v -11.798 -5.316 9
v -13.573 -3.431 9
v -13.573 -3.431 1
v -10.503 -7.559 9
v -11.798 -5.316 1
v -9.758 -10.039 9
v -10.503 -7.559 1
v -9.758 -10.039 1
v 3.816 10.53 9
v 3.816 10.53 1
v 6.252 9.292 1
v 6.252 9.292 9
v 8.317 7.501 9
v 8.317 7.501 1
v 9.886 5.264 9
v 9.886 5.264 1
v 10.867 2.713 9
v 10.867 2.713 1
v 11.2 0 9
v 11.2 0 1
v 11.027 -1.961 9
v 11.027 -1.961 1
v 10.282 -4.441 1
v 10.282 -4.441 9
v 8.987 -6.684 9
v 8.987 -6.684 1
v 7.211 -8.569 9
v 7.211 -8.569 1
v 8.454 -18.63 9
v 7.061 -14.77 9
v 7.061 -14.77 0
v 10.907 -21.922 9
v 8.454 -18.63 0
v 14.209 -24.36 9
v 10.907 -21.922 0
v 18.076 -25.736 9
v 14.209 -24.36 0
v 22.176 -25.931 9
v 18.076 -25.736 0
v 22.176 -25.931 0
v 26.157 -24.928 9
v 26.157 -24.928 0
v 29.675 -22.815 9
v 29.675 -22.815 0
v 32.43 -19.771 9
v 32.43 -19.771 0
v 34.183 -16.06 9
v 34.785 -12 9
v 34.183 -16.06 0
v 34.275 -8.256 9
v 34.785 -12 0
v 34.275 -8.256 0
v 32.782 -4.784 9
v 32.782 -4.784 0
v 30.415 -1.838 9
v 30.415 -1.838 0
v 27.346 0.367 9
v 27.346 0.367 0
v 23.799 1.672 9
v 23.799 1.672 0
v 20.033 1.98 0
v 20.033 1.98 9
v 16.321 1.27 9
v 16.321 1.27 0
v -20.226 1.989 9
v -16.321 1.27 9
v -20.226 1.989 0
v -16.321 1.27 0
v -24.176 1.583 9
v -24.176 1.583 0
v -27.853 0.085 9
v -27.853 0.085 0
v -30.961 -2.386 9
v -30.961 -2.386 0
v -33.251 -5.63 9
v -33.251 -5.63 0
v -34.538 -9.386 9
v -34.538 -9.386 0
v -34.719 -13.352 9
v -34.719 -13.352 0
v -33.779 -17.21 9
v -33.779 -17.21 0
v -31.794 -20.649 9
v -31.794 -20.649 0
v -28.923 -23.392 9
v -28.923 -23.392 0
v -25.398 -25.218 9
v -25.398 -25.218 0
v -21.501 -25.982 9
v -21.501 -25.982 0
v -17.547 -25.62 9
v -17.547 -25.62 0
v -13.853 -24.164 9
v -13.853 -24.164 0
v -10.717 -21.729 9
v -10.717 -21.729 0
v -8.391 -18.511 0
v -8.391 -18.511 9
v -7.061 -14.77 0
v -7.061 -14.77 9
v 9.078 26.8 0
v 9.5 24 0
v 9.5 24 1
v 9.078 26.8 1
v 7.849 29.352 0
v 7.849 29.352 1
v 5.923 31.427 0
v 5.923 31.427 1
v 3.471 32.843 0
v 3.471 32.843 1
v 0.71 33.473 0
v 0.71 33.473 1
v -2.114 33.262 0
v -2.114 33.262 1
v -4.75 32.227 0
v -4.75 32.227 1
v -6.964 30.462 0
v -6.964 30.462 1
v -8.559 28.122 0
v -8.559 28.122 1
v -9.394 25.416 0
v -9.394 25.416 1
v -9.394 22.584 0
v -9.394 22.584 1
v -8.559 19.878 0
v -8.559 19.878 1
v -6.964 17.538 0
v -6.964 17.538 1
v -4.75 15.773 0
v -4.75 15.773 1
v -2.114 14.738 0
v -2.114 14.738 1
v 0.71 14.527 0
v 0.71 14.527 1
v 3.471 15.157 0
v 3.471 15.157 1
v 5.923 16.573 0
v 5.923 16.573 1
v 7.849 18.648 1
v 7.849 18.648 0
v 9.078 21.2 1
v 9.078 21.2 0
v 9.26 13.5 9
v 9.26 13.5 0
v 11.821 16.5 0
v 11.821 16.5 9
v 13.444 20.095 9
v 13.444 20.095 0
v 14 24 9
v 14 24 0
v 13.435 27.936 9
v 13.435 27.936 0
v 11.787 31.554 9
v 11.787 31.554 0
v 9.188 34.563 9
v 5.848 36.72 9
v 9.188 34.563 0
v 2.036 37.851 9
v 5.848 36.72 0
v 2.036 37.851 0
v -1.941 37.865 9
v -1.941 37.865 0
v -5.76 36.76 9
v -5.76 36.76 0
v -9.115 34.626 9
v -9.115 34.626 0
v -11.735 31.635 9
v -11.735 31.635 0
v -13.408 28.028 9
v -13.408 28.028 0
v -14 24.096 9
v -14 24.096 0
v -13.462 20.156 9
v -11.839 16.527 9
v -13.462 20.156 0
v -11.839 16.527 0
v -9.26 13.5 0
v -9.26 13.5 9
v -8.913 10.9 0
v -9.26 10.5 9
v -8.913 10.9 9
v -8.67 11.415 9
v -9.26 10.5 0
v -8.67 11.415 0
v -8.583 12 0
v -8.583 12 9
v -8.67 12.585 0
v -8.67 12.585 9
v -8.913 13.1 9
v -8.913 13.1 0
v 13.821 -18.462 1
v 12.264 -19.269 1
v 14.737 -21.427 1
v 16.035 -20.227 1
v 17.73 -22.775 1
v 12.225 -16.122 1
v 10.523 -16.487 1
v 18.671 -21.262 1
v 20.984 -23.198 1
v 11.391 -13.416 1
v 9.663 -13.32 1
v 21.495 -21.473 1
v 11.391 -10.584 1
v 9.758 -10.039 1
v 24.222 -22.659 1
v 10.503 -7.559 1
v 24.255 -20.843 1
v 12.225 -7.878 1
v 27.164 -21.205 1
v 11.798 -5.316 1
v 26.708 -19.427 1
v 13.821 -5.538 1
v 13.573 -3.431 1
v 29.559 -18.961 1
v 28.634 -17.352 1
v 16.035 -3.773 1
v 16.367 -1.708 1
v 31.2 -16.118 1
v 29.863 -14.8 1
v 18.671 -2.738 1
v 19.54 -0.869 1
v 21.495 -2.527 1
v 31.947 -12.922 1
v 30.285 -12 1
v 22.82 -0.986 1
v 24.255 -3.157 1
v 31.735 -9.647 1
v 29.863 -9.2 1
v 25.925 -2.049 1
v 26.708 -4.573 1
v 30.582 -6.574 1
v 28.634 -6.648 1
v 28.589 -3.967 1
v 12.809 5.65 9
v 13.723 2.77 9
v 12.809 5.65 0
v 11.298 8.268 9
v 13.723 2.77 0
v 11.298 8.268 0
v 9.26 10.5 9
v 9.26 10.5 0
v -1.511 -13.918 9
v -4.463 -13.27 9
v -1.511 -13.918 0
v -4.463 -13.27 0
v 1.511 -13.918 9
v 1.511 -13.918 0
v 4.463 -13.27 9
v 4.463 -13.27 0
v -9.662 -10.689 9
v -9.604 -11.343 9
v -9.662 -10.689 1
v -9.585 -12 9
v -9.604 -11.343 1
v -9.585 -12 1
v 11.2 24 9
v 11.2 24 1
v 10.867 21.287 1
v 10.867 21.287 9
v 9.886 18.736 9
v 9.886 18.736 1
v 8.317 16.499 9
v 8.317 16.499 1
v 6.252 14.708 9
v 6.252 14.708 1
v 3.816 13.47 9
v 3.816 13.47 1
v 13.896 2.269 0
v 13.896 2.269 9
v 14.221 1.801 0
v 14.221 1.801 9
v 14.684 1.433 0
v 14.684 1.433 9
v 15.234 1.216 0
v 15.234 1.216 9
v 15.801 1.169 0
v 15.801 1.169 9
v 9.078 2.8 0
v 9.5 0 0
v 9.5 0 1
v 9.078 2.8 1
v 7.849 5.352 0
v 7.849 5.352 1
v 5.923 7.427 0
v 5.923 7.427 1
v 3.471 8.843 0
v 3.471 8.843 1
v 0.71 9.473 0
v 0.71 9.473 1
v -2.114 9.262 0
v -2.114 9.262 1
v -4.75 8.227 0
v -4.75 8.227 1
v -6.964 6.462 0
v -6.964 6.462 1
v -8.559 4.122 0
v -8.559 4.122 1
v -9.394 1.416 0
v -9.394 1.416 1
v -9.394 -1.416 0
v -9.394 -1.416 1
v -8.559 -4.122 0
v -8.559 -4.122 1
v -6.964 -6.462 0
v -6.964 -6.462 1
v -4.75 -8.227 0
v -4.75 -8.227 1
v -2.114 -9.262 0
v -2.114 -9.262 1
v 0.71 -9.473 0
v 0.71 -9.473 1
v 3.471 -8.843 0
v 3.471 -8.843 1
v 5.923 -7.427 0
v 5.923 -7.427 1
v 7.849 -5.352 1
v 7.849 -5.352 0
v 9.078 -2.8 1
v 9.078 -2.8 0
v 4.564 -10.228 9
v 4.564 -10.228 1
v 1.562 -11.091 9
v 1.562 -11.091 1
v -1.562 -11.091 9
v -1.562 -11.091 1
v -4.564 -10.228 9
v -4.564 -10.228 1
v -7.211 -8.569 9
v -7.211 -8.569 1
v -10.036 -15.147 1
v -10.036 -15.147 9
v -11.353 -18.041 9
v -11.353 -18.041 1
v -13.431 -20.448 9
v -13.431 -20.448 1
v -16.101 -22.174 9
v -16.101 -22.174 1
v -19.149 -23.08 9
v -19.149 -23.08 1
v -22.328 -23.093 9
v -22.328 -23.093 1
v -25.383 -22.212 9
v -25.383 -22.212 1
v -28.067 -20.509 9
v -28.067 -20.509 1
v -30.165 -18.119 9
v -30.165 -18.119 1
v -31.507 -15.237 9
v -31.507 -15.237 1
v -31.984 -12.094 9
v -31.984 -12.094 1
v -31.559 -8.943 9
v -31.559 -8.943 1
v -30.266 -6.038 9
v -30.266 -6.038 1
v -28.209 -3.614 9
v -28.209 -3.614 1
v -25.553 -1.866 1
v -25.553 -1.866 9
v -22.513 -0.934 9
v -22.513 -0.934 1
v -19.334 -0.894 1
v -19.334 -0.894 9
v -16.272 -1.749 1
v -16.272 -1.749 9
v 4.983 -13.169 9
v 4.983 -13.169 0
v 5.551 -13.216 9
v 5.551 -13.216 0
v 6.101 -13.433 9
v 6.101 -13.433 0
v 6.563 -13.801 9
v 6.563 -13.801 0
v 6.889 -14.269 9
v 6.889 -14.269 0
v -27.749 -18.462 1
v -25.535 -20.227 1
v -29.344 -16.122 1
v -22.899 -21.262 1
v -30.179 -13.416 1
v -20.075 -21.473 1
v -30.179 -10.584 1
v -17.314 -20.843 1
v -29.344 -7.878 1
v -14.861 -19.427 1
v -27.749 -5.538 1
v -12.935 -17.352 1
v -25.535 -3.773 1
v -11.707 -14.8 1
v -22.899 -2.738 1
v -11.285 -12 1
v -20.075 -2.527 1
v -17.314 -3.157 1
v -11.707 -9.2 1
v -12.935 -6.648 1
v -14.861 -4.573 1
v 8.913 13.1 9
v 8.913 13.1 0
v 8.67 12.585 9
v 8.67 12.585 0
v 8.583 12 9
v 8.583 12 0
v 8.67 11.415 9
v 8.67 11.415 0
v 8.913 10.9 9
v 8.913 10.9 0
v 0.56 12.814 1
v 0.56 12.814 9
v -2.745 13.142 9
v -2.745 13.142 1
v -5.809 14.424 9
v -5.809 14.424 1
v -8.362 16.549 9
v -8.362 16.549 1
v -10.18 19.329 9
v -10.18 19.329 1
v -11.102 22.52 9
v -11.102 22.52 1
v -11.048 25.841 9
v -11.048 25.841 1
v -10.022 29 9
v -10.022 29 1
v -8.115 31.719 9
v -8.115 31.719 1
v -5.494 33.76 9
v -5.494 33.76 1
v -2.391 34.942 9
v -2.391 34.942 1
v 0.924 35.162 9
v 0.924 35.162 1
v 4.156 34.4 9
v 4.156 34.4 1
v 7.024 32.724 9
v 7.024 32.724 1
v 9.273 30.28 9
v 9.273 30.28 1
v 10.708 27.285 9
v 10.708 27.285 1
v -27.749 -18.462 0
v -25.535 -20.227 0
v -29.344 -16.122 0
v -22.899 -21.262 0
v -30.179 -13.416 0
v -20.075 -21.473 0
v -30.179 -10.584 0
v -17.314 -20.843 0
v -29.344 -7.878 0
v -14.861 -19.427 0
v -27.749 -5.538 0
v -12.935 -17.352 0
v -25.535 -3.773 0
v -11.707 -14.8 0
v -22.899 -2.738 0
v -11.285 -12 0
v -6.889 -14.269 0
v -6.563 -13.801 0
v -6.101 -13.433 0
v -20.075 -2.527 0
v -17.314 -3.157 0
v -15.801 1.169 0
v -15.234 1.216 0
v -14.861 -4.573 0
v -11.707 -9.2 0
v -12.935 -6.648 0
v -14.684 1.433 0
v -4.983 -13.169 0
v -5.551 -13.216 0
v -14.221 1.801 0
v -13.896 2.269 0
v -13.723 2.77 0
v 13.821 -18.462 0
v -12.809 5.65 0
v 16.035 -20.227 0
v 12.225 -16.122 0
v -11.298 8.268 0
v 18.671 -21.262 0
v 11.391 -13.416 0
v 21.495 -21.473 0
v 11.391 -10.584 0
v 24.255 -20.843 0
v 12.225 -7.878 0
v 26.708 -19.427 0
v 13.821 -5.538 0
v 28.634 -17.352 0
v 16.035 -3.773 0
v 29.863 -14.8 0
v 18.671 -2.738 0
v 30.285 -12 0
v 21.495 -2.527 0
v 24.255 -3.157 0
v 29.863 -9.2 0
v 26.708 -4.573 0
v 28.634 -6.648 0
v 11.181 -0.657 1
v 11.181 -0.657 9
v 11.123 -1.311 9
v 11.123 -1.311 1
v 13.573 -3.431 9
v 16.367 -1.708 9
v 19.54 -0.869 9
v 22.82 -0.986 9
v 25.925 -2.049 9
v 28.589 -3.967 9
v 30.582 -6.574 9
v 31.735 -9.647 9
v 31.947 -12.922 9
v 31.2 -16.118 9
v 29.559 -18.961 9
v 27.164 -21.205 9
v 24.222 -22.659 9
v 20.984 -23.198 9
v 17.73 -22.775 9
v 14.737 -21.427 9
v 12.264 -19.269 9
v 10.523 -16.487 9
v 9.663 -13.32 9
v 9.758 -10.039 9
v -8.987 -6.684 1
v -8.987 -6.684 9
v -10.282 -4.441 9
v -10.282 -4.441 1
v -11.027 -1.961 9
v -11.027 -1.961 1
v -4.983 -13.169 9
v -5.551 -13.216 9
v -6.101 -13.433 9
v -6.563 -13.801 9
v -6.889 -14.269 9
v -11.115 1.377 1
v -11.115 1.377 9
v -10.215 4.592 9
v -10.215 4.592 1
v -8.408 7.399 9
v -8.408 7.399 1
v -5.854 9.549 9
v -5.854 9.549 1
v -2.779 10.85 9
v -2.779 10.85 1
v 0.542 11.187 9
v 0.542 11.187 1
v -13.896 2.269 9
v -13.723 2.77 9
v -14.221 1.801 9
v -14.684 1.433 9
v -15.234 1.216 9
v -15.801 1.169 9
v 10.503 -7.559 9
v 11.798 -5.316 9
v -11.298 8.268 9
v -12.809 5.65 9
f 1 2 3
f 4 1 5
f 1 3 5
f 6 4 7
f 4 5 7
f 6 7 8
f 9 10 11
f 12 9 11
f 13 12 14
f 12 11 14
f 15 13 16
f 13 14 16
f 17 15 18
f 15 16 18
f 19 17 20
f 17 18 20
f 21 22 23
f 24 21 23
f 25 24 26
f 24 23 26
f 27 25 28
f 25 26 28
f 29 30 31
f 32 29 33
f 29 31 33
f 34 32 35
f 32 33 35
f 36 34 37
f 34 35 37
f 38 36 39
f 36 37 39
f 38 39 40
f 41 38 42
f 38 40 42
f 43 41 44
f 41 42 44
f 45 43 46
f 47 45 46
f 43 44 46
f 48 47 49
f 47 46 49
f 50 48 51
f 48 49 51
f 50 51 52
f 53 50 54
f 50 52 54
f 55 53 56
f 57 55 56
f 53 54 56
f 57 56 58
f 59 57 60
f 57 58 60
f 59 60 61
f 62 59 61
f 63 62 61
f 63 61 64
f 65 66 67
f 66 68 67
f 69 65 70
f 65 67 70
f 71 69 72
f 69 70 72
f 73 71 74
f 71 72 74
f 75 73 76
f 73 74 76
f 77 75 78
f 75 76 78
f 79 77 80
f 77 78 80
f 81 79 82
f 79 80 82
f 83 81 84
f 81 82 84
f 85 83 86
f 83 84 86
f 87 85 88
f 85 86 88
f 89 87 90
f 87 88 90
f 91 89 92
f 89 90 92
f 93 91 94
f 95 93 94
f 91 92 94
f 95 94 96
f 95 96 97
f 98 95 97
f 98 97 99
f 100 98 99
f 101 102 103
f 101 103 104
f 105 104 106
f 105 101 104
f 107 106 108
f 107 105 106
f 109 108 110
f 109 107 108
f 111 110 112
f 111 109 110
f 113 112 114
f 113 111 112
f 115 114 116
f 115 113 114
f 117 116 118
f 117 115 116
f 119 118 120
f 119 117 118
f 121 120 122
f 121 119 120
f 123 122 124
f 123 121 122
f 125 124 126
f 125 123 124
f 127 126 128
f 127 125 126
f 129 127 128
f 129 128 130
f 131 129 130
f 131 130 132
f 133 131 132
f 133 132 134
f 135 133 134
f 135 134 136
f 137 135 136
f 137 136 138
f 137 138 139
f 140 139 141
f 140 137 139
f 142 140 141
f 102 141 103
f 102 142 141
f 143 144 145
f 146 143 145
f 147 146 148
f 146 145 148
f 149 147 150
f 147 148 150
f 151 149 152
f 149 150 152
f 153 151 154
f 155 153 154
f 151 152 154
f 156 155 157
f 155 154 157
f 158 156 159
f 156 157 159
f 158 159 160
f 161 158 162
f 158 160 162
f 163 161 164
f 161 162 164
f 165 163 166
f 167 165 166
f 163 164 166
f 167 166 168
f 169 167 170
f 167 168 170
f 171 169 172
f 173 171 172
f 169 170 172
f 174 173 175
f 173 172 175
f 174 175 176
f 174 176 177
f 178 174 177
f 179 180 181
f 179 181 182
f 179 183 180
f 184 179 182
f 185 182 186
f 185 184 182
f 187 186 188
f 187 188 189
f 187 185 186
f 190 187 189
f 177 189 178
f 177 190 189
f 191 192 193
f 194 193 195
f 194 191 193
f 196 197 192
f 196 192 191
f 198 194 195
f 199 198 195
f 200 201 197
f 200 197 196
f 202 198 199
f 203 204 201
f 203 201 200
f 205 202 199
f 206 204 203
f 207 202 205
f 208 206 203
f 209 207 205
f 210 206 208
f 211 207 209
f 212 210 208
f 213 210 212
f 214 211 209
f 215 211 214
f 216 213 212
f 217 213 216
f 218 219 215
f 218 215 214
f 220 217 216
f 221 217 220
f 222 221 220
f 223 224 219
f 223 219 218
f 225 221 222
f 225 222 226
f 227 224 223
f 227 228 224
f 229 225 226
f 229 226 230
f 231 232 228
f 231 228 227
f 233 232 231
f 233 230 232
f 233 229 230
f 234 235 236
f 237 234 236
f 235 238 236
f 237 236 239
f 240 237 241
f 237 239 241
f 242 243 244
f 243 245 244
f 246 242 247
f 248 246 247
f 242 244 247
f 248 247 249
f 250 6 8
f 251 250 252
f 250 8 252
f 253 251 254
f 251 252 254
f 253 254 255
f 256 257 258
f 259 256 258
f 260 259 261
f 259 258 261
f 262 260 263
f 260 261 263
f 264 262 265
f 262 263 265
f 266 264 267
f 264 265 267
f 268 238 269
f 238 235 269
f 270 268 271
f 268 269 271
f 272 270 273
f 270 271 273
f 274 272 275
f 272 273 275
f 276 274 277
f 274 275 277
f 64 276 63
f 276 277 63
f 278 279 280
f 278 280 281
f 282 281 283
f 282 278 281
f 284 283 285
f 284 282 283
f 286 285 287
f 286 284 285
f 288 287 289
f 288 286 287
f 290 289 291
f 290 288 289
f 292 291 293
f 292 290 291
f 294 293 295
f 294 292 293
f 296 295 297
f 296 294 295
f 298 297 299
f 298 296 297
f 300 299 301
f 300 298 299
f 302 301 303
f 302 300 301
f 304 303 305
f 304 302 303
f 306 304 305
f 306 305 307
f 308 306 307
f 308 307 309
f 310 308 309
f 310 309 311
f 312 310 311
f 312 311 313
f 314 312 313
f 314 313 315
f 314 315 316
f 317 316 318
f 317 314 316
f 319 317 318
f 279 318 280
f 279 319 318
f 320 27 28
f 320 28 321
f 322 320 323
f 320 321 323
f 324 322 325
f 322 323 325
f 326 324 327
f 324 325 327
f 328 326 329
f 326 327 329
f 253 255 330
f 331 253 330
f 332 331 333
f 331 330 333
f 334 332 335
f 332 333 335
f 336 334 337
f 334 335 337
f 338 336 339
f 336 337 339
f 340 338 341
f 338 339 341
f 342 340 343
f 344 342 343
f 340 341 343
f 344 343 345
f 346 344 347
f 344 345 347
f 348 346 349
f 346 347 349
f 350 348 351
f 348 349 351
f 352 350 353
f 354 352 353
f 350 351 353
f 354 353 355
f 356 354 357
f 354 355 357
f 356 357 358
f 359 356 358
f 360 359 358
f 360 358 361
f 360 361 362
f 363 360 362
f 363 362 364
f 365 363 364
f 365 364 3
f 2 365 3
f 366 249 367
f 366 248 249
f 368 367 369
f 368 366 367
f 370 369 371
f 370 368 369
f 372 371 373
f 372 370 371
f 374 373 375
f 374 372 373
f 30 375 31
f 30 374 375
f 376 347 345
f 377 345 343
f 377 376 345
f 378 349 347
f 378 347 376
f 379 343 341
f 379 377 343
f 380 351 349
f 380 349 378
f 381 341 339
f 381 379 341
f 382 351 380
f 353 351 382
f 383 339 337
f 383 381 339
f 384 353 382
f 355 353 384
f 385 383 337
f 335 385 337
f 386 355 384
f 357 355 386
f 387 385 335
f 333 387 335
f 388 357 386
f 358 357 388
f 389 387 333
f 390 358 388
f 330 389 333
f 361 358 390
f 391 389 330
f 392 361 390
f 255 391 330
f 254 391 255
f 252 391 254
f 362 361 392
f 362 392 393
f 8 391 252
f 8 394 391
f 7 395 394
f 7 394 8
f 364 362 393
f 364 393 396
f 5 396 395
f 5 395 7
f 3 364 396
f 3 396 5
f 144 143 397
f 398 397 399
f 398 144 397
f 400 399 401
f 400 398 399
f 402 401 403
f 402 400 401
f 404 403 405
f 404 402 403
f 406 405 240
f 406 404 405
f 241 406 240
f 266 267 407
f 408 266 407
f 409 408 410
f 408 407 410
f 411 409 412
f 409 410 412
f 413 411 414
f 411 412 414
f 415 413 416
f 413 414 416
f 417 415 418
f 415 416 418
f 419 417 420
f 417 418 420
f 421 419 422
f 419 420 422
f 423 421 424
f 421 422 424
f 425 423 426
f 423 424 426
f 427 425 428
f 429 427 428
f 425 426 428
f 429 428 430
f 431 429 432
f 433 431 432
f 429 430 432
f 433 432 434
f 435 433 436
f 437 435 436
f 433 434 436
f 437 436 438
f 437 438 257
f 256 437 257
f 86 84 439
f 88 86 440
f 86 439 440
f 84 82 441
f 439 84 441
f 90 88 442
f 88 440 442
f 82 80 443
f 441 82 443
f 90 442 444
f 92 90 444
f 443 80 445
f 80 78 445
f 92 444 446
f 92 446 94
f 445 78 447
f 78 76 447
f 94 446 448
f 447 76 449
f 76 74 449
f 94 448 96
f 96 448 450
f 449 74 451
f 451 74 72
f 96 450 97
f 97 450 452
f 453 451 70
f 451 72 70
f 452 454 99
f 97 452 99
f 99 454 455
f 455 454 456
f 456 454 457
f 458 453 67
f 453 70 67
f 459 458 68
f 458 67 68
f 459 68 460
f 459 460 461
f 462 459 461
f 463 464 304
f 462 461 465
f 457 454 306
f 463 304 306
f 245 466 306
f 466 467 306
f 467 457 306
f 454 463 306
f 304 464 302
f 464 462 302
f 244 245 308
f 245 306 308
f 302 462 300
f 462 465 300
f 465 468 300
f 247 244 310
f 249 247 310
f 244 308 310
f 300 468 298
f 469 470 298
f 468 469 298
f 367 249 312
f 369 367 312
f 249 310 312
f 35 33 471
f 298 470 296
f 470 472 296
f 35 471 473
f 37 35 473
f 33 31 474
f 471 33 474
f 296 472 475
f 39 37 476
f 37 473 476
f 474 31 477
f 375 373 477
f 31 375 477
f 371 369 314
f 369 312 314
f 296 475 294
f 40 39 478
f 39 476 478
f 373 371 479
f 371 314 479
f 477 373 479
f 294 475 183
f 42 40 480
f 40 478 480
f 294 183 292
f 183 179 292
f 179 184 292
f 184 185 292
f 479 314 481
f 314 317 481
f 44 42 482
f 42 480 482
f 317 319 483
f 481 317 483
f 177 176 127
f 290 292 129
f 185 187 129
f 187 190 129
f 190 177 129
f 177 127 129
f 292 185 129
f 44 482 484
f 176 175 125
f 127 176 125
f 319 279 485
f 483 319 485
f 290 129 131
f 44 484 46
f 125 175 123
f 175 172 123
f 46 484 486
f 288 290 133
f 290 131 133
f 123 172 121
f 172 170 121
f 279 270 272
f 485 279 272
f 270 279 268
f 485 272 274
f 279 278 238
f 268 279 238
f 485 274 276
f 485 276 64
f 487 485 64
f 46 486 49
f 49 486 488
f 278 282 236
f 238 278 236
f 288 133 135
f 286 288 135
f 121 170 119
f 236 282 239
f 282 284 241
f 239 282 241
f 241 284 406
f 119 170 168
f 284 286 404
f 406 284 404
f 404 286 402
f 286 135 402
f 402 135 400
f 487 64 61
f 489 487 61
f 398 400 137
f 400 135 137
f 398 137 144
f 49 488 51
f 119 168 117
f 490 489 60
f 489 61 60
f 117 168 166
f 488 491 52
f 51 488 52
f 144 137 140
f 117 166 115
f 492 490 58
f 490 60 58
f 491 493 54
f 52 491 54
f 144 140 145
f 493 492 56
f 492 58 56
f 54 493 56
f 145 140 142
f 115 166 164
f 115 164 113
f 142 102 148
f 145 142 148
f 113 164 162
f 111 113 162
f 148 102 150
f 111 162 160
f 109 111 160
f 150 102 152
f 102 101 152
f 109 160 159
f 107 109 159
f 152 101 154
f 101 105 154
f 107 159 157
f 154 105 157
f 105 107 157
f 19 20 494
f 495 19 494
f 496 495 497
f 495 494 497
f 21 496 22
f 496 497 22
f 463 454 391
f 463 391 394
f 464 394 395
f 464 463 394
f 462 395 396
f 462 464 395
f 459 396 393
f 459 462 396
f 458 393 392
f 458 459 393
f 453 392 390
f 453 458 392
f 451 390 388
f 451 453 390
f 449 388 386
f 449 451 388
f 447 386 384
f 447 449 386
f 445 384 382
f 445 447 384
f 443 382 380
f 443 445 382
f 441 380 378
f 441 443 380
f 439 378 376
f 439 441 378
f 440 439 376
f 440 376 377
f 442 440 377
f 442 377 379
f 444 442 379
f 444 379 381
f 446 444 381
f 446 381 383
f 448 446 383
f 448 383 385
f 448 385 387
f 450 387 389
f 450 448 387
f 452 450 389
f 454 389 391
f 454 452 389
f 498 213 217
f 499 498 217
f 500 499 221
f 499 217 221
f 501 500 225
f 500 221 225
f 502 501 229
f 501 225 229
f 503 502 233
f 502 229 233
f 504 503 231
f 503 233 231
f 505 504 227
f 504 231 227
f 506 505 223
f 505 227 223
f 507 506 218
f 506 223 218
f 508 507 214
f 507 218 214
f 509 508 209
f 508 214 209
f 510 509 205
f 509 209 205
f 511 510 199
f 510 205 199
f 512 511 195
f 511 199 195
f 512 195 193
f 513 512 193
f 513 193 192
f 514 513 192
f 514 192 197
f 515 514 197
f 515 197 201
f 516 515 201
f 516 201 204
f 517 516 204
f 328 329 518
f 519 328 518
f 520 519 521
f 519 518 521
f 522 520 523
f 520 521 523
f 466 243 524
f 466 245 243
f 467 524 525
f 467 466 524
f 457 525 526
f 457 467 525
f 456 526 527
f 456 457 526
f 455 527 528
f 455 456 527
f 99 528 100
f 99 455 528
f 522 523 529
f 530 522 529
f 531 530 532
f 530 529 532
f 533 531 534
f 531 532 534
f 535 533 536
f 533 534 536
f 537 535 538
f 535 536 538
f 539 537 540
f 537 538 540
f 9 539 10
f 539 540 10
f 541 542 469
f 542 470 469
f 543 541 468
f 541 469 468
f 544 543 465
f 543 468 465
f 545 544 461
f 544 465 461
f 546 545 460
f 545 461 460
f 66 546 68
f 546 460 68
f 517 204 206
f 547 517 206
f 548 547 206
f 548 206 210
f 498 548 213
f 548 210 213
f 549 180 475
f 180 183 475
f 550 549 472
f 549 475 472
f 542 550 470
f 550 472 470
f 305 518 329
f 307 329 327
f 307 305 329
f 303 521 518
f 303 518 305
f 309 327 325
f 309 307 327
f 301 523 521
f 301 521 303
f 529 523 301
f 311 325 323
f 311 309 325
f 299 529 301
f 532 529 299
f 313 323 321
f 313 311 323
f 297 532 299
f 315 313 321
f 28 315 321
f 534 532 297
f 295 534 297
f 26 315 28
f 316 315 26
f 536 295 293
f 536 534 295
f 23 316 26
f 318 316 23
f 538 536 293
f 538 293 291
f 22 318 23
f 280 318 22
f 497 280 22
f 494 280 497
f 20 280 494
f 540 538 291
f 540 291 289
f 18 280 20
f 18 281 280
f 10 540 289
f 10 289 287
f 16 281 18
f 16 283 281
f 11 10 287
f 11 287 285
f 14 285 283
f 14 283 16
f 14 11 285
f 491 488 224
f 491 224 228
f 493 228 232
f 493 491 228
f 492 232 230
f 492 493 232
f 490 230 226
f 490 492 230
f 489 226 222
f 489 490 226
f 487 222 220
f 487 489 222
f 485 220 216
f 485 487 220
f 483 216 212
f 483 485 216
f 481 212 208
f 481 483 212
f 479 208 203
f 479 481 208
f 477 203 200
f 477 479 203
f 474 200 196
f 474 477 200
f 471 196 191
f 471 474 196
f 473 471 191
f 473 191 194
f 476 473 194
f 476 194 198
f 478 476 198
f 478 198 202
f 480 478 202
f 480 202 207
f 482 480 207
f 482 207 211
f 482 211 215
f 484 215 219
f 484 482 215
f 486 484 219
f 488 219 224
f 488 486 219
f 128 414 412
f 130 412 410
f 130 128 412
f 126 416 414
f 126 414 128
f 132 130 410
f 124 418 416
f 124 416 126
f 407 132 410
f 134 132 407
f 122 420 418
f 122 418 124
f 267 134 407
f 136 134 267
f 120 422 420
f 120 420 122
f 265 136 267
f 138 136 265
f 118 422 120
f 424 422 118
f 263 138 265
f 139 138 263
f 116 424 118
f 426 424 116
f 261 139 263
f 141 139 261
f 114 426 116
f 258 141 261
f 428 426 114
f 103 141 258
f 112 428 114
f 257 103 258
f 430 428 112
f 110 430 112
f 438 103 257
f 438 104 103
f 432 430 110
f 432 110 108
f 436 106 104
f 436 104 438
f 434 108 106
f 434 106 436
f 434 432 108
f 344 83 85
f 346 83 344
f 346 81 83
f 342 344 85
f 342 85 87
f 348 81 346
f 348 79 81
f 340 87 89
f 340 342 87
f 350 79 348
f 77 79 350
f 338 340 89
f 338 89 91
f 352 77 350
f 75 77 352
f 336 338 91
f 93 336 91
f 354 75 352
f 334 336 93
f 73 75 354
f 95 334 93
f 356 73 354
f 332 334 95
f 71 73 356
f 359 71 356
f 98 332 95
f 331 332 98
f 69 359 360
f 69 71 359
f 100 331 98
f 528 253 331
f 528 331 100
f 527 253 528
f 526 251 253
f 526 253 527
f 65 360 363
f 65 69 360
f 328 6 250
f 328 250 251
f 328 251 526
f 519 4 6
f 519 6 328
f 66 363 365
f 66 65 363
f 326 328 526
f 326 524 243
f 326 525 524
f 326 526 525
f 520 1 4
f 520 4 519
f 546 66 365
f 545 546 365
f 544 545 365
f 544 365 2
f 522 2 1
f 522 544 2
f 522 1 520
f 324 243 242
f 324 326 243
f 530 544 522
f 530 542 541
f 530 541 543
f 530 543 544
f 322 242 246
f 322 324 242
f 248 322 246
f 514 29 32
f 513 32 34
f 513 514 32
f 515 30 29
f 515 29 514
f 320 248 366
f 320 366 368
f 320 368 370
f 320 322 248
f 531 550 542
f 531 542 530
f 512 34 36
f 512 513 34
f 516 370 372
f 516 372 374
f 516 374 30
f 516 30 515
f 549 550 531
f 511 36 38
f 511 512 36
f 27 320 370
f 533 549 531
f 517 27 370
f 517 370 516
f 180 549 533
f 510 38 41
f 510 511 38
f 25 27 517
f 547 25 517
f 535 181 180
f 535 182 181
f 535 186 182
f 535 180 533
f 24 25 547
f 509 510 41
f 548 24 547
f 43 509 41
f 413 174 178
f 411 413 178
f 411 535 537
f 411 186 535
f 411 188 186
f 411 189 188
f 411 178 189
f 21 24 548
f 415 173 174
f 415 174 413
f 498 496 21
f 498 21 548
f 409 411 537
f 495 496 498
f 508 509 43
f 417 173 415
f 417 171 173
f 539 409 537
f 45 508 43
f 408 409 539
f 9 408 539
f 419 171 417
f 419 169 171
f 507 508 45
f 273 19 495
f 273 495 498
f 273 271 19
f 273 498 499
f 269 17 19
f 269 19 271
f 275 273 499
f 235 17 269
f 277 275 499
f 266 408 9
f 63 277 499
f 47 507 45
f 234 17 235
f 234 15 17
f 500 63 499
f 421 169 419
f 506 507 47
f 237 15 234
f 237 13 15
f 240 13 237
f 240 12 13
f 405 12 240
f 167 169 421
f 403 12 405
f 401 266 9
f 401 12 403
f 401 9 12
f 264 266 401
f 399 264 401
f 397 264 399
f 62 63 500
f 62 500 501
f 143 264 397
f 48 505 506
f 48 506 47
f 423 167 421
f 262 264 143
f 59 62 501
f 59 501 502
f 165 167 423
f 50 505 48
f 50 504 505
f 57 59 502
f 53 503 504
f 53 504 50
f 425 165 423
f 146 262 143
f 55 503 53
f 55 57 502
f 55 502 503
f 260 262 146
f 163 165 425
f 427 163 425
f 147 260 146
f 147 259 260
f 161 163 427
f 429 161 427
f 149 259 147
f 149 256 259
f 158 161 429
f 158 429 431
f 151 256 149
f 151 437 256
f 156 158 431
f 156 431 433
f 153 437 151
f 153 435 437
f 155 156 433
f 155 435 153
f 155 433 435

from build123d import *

# Parameters (mm, degrees)
F0_R     = 9.5
F1_DEPTH = 1
F2_DEPTH = 9
F3_R     = 2


with BuildPart() as f1:
    # F0 (on Top) → F1 (new body)
    with BuildSketch(Plane.XY):
        with BuildLine():
            ThreePointArc((3.8156388718, 10.53), (9.1699278995, 6.4305849126), (11.2, 0))
            ThreePointArc((11.2, 0), (11.1566829681, -0.9840859457), (11.0270669378, -1.9605598054))
            ThreePointArc((11.0270669378, -1.9605598054), (12.4392782707, -0.7592062786), (13.9978561209, 0.2449979984))
            ThreePointArc((13.9978561209, 0.2449979984), (12.124355653, 7), (7.2111025509, 12))
            ThreePointArc((7.2111025509, 12), (5.5621472114, 11.1523341264), (3.8156388718, 10.53))
        make_face()
        with BuildLine():
            ThreePointArc((-3.8156388718, 10.53), (0, 11.2), (3.8156388718, 10.53))
            ThreePointArc((3.8156388718, 10.53), (5.5621472114, 11.1523341264), (7.2111025509, 12))
            ThreePointArc((7.2111025509, 12), (5.5621472114, 12.8476658736), (3.8156388718, 13.47))
            ThreePointArc((3.8156388718, 13.47), (0, 12.8), (-3.8156388718, 13.47))
            ThreePointArc((-3.8156388718, 13.47), (-5.5621472114, 12.8476658736), (-7.2111025509, 12))
            ThreePointArc((-7.2111025509, 12), (-5.5621472114, 11.1523341264), (-3.8156388718, 10.53))
        make_face()
        with BuildLine():
            ThreePointArc((13.9978561209, 0.2449979984), (12.4392782707, -0.7592062786), (11.0270669378, -1.9605598054))
            ThreePointArc((11.0270669378, -1.9605598054), (9.6994845224, -5.6), (7.2114280659, -8.5694401946))
            ThreePointArc((7.2114280659, -8.5694401946), (6.8771310593, -10.3931278478), (6.7867535699, -12.2449979984))
            ThreePointArc((6.7867535699, -12.2449979984), (8.3453314202, -11.2407937214), (9.7575427531, -10.0394401946))
            ThreePointArc((9.7575427531, -10.0394401946), (11.0851251684, -6.4), (13.5731816249, -3.4305598054))
            ThreePointArc((13.5731816249, -3.4305598054), (13.8928856388, -1.728504737), (14, 0))
            ThreePointArc((14, 0), (13.99946402, 0.1225036892), (13.9978561209, 0.2449979984))
        make_face()
        with BuildLine():
            ThreePointArc((-11.0270669378, -1.9605598054), (-9.6994845224, 5.6), (-3.8156388718, 10.53))
            ThreePointArc((-3.8156388718, 10.53), (-5.5621472114, 11.1523341264), (-7.2111025509, 12))
            ThreePointArc((-7.2111025509, 12), (-12.124355653, 7), (-13.9978561209, 0.2449979984))
            ThreePointArc((-13.9978561209, 0.2449979984), (-12.4392782707, -0.7592062786), (-11.0270669378, -1.9605598054))
        make_face()
        with BuildLine():
            ThreePointArc((3.8156388718, 13.47), (5.5621472114, 12.8476658736), (7.2111025509, 12))
            ThreePointArc((7.2111025509, 12), (12.1851433252, 17.1063592969), (14, 24))
            ThreePointArc((14, 24), (-6.8936407031, 36.1851433252), (-7.2111025509, 12))
            ThreePointArc((-7.2111025509, 12), (-5.5621472114, 12.8476658736), (-3.8156388718, 13.47))
            ThreePointArc((-3.8156388718, 13.47), (-6.4305849126, 33.1699278995), (11.2, 24))
            ThreePointArc((11.2, 24), (9.1699278995, 17.5694150874), (3.8156388718, 13.47))
        make_face()
        with BuildLine():
            ThreePointArc((6.7867535699, -12.2449979984), (6.8771310593, -10.3931278478), (7.2114280659, -8.5694401946))
            ThreePointArc((7.2114280659, -8.5694401946), (0, -11.2), (-7.2114280659, -8.5694401946))
            ThreePointArc((-7.2114280659, -8.5694401946), (-6.891724052, -10.271495263), (-6.7846096908, -12))
            ThreePointArc((-6.7846096908, -12), (-6.7851456709, -12.1225036892), (-6.7867535699, -12.2449979984))
            ThreePointArc((-6.7867535699, -12.2449979984), (0, -14), (6.7867535699, -12.2449979984))
        make_face()
        with BuildLine():
            ThreePointArc((34.7846096908, -12), (27.8904330077, 0.0626396361), (13.9978561209, 0.2449979984))
            ThreePointArc((13.9978561209, 0.2449979984), (13.99946402, 0.1225036892), (14, 0))
            ThreePointArc((14, 0), (13.8928856388, -1.728504737), (13.5731816249, -3.4305598054))
            ThreePointArc((13.5731816249, -3.4305598054), (25.5107077464, -1.8459861548), (31.9846096908, -12))
            ThreePointArc((31.9846096908, -12), (19.8005237451, -23.1566829681), (9.7575427531, -10.0394401946))
            ThreePointArc((9.7575427531, -10.0394401946), (8.3453314202, -11.2407937214), (6.7867535699, -12.2449979984))
            ThreePointArc((6.7867535699, -12.2449979984), (20.90711338, -25.99946402), (34.7846096908, -12))
        make_face()
        with BuildLine():
            ThreePointArc((-7.2114280659, -8.5694401946), (-9.6994845224, -5.6), (-11.0270669378, -1.9605598054))
            ThreePointArc((-11.0270669378, -1.9605598054), (-12.4392782707, -0.7592062786), (-13.9978561209, 0.2449979984))
            ThreePointArc((-13.9978561209, 0.2449979984), (-13.9074786315, -1.6068721522), (-13.5731816249, -3.4305598054))
            ThreePointArc((-13.5731816249, -3.4305598054), (-11.0851251684, -6.4), (-9.7575427531, -10.0394401946))
            ThreePointArc((-9.7575427531, -10.0394401946), (-8.3453314202, -11.2407937214), (-6.7867535699, -12.2449979984))
            ThreePointArc((-6.7867535699, -12.2449979984), (-6.7851456709, -12.1225036892), (-6.7846096908, -12))
            ThreePointArc((-6.7846096908, -12), (-6.891724052, -10.271495263), (-7.2114280659, -8.5694401946))
        make_face()
        with BuildLine():
            ThreePointArc((-13.5731816249, -3.4305598054), (-13.9074786315, -1.6068721522), (-13.9978561209, 0.2449979984))
            ThreePointArc((-13.9978561209, 0.2449979984), (-32.9089653438, -19), (-6.7867535699, -12.2449979984))
            ThreePointArc((-6.7867535699, -12.2449979984), (-8.3453314202, -11.2407937214), (-9.7575427531, -10.0394401946))
            ThreePointArc((-9.7575427531, -10.0394401946), (-9.6279267227, -11.0159140543), (-9.5846096908, -12))
            ThreePointArc((-9.5846096908, -12), (-30.9386235361, -16.7260980556), (-13.5731816249, -3.4305598054))
        make_face()
        with BuildLine():
            ThreePointArc((11.0270669378, -1.9605598054), (11.1566829681, -0.9840859457), (11.2, 0))
            ThreePointArc((11.2, 0), (9.1699278995, 6.4305849126), (3.8156388718, 10.53))
            ThreePointArc((3.8156388718, 10.53), (0, 10), (-3.8156388718, 10.53))
            ThreePointArc((-3.8156388718, 10.53), (-9.6994845224, 5.6), (-11.0270669378, -1.9605598054))
            ThreePointArc((-11.0270669378, -1.9605598054), (-8.6602540378, -5), (-7.2114280659, -8.5694401946))
            ThreePointArc((-7.2114280659, -8.5694401946), (0, -11.2), (7.2114280659, -8.5694401946))
            ThreePointArc((7.2114280659, -8.5694401946), (8.6602540378, -5), (11.0270669378, -1.9605598054))
        make_face()
        Circle(F0_R, mode=Mode.SUBTRACT)
        with BuildLine():
            ThreePointArc((-3.8156388718, 13.47), (0, 12.8), (3.8156388718, 13.47))
            ThreePointArc((3.8156388718, 13.47), (0, 14), (-3.8156388718, 13.47))
        make_face()
        with BuildLine():
            ThreePointArc((-3.8156388718, 13.47), (0, 14), (3.8156388718, 13.47))
            ThreePointArc((3.8156388718, 13.47), (9.1699278995, 17.5694150874), (11.2, 24))
            ThreePointArc((11.2, 24), (-6.4305849126, 33.1699278995), (-3.8156388718, 13.47))
        make_face()
        with Locations((0, 24)):
            Circle(F0_R, mode=Mode.SUBTRACT)
        with BuildLine():
            ThreePointArc((-9.7575427531, -10.0394401946), (-11.0851251684, -6.4), (-13.5731816249, -3.4305598054))
            ThreePointArc((-13.5731816249, -3.4305598054), (-12.124355653, -7), (-9.7575427531, -10.0394401946))
        make_face()
        with BuildLine():
            ThreePointArc((-9.7575427531, -10.0394401946), (-12.124355653, -7), (-13.5731816249, -3.4305598054))
            ThreePointArc((-13.5731816249, -3.4305598054), (-30.9386235361, -16.7260980556), (-9.5846096908, -12))
            ThreePointArc((-9.5846096908, -12), (-9.6279267227, -11.0159140543), (-9.7575427531, -10.0394401946))
        make_face()
        with Locations((-20.7846096908, -12)):
            Circle(F0_R, mode=Mode.SUBTRACT)
        with BuildLine():
            ThreePointArc((13.5731816249, -3.4305598054), (11.0851251684, -6.4), (9.7575427531, -10.0394401946))
            ThreePointArc((9.7575427531, -10.0394401946), (12.124355653, -7), (13.5731816249, -3.4305598054))
        make_face()
        with BuildLine():
            ThreePointArc((13.5731816249, -3.4305598054), (12.124355653, -7), (9.7575427531, -10.0394401946))
            ThreePointArc((9.7575427531, -10.0394401946), (19.8005237451, -23.1566829681), (31.9846096908, -12))
            ThreePointArc((31.9846096908, -12), (25.5107077464, -1.8459861548), (13.5731816249, -3.4305598054))
        make_face()
        with Locations((20.7846096908, -12)):
            Circle(F0_R, mode=Mode.SUBTRACT)
        with BuildLine():
            ThreePointArc((-7.2114280659, -8.5694401946), (-8.6602540378, -5), (-11.0270669378, -1.9605598054))
            ThreePointArc((-11.0270669378, -1.9605598054), (-9.6994845224, -5.6), (-7.2114280659, -8.5694401946))
        make_face()
        with BuildLine():
            ThreePointArc((7.2114280659, -8.5694401946), (9.6994845224, -5.6), (11.0270669378, -1.9605598054))
            ThreePointArc((11.0270669378, -1.9605598054), (8.6602540378, -5), (7.2114280659, -8.5694401946))
        make_face()
        with BuildLine():
            ThreePointArc((-3.8156388718, 10.53), (0, 10), (3.8156388718, 10.53))
            ThreePointArc((3.8156388718, 10.53), (0, 11.2), (-3.8156388718, 10.53))
        make_face()
    extrude(amount=F1_DEPTH)

    # F0 (on Top) → F2 (join)
    with BuildSketch(Plane.XY):
        with BuildLine():
            ThreePointArc((3.8156388718, 10.53), (9.1699278995, 6.4305849126), (11.2, 0))
            ThreePointArc((11.2, 0), (11.1566829681, -0.9840859457), (11.0270669378, -1.9605598054))
            ThreePointArc((11.0270669378, -1.9605598054), (12.4392782707, -0.7592062786), (13.9978561209, 0.2449979984))
            ThreePointArc((13.9978561209, 0.2449979984), (12.124355653, 7), (7.2111025509, 12))
            ThreePointArc((7.2111025509, 12), (5.5621472114, 11.1523341264), (3.8156388718, 10.53))
        make_face()
        with BuildLine():
            ThreePointArc((-3.8156388718, 10.53), (0, 11.2), (3.8156388718, 10.53))
            ThreePointArc((3.8156388718, 10.53), (5.5621472114, 11.1523341264), (7.2111025509, 12))
            ThreePointArc((7.2111025509, 12), (5.5621472114, 12.8476658736), (3.8156388718, 13.47))
            ThreePointArc((3.8156388718, 13.47), (0, 12.8), (-3.8156388718, 13.47))
            ThreePointArc((-3.8156388718, 13.47), (-5.5621472114, 12.8476658736), (-7.2111025509, 12))
            ThreePointArc((-7.2111025509, 12), (-5.5621472114, 11.1523341264), (-3.8156388718, 10.53))
        make_face()
        with BuildLine():
            ThreePointArc((13.9978561209, 0.2449979984), (12.4392782707, -0.7592062786), (11.0270669378, -1.9605598054))
            ThreePointArc((11.0270669378, -1.9605598054), (9.6994845224, -5.6), (7.2114280659, -8.5694401946))
            ThreePointArc((7.2114280659, -8.5694401946), (6.8771310593, -10.3931278478), (6.7867535699, -12.2449979984))
            ThreePointArc((6.7867535699, -12.2449979984), (8.3453314202, -11.2407937214), (9.7575427531, -10.0394401946))
            ThreePointArc((9.7575427531, -10.0394401946), (11.0851251684, -6.4), (13.5731816249, -3.4305598054))
            ThreePointArc((13.5731816249, -3.4305598054), (13.8928856388, -1.728504737), (14, 0))
            ThreePointArc((14, 0), (13.99946402, 0.1225036892), (13.9978561209, 0.2449979984))
        make_face()
        with BuildLine():
            ThreePointArc((-11.0270669378, -1.9605598054), (-9.6994845224, 5.6), (-3.8156388718, 10.53))
            ThreePointArc((-3.8156388718, 10.53), (-5.5621472114, 11.1523341264), (-7.2111025509, 12))
            ThreePointArc((-7.2111025509, 12), (-12.124355653, 7), (-13.9978561209, 0.2449979984))
            ThreePointArc((-13.9978561209, 0.2449979984), (-12.4392782707, -0.7592062786), (-11.0270669378, -1.9605598054))
        make_face()
        with BuildLine():
            ThreePointArc((3.8156388718, 13.47), (5.5621472114, 12.8476658736), (7.2111025509, 12))
            ThreePointArc((7.2111025509, 12), (12.1851433252, 17.1063592969), (14, 24))
            ThreePointArc((14, 24), (-6.8936407031, 36.1851433252), (-7.2111025509, 12))
            ThreePointArc((-7.2111025509, 12), (-5.5621472114, 12.8476658736), (-3.8156388718, 13.47))
            ThreePointArc((-3.8156388718, 13.47), (-6.4305849126, 33.1699278995), (11.2, 24))
            ThreePointArc((11.2, 24), (9.1699278995, 17.5694150874), (3.8156388718, 13.47))
        make_face()
        with BuildLine():
            ThreePointArc((6.7867535699, -12.2449979984), (6.8771310593, -10.3931278478), (7.2114280659, -8.5694401946))
            ThreePointArc((7.2114280659, -8.5694401946), (0, -11.2), (-7.2114280659, -8.5694401946))
            ThreePointArc((-7.2114280659, -8.5694401946), (-6.891724052, -10.271495263), (-6.7846096908, -12))
            ThreePointArc((-6.7846096908, -12), (-6.7851456709, -12.1225036892), (-6.7867535699, -12.2449979984))
            ThreePointArc((-6.7867535699, -12.2449979984), (0, -14), (6.7867535699, -12.2449979984))
        make_face()
        with BuildLine():
            ThreePointArc((34.7846096908, -12), (27.8904330077, 0.0626396361), (13.9978561209, 0.2449979984))
            ThreePointArc((13.9978561209, 0.2449979984), (13.99946402, 0.1225036892), (14, 0))
            ThreePointArc((14, 0), (13.8928856388, -1.728504737), (13.5731816249, -3.4305598054))
            ThreePointArc((13.5731816249, -3.4305598054), (25.5107077464, -1.8459861548), (31.9846096908, -12))
            ThreePointArc((31.9846096908, -12), (19.8005237451, -23.1566829681), (9.7575427531, -10.0394401946))
            ThreePointArc((9.7575427531, -10.0394401946), (8.3453314202, -11.2407937214), (6.7867535699, -12.2449979984))
            ThreePointArc((6.7867535699, -12.2449979984), (20.90711338, -25.99946402), (34.7846096908, -12))
        make_face()
        with BuildLine():
            ThreePointArc((-7.2114280659, -8.5694401946), (-9.6994845224, -5.6), (-11.0270669378, -1.9605598054))
            ThreePointArc((-11.0270669378, -1.9605598054), (-12.4392782707, -0.7592062786), (-13.9978561209, 0.2449979984))
            ThreePointArc((-13.9978561209, 0.2449979984), (-13.9074786315, -1.6068721522), (-13.5731816249, -3.4305598054))
            ThreePointArc((-13.5731816249, -3.4305598054), (-11.0851251684, -6.4), (-9.7575427531, -10.0394401946))
            ThreePointArc((-9.7575427531, -10.0394401946), (-8.3453314202, -11.2407937214), (-6.7867535699, -12.2449979984))
            ThreePointArc((-6.7867535699, -12.2449979984), (-6.7851456709, -12.1225036892), (-6.7846096908, -12))
            ThreePointArc((-6.7846096908, -12), (-6.891724052, -10.271495263), (-7.2114280659, -8.5694401946))
        make_face()
        with BuildLine():
            ThreePointArc((-13.5731816249, -3.4305598054), (-13.9074786315, -1.6068721522), (-13.9978561209, 0.2449979984))
            ThreePointArc((-13.9978561209, 0.2449979984), (-32.9089653438, -19), (-6.7867535699, -12.2449979984))
            ThreePointArc((-6.7867535699, -12.2449979984), (-8.3453314202, -11.2407937214), (-9.7575427531, -10.0394401946))
            ThreePointArc((-9.7575427531, -10.0394401946), (-9.6279267227, -11.0159140543), (-9.5846096908, -12))
            ThreePointArc((-9.5846096908, -12), (-30.9386235361, -16.7260980556), (-13.5731816249, -3.4305598054))
        make_face()
    extrude(amount=F2_DEPTH)

    # F3
    f3_edges = [f1.edges().sort_by_distance(p)[0] for p in [
        (-7.211103, 12, 4.5),
        (-13.997856, 0.244998, 4.5),
        (-6.786754, -12.244998, 4.5),
        (6.786754, -12.244998, 4.5),
        (13.997856, 0.244998, 4.5),
        (7.211103, 12, 4.5),
    ]]
    fillet(f3_edges, radius=F3_R)


solid = f1.part
